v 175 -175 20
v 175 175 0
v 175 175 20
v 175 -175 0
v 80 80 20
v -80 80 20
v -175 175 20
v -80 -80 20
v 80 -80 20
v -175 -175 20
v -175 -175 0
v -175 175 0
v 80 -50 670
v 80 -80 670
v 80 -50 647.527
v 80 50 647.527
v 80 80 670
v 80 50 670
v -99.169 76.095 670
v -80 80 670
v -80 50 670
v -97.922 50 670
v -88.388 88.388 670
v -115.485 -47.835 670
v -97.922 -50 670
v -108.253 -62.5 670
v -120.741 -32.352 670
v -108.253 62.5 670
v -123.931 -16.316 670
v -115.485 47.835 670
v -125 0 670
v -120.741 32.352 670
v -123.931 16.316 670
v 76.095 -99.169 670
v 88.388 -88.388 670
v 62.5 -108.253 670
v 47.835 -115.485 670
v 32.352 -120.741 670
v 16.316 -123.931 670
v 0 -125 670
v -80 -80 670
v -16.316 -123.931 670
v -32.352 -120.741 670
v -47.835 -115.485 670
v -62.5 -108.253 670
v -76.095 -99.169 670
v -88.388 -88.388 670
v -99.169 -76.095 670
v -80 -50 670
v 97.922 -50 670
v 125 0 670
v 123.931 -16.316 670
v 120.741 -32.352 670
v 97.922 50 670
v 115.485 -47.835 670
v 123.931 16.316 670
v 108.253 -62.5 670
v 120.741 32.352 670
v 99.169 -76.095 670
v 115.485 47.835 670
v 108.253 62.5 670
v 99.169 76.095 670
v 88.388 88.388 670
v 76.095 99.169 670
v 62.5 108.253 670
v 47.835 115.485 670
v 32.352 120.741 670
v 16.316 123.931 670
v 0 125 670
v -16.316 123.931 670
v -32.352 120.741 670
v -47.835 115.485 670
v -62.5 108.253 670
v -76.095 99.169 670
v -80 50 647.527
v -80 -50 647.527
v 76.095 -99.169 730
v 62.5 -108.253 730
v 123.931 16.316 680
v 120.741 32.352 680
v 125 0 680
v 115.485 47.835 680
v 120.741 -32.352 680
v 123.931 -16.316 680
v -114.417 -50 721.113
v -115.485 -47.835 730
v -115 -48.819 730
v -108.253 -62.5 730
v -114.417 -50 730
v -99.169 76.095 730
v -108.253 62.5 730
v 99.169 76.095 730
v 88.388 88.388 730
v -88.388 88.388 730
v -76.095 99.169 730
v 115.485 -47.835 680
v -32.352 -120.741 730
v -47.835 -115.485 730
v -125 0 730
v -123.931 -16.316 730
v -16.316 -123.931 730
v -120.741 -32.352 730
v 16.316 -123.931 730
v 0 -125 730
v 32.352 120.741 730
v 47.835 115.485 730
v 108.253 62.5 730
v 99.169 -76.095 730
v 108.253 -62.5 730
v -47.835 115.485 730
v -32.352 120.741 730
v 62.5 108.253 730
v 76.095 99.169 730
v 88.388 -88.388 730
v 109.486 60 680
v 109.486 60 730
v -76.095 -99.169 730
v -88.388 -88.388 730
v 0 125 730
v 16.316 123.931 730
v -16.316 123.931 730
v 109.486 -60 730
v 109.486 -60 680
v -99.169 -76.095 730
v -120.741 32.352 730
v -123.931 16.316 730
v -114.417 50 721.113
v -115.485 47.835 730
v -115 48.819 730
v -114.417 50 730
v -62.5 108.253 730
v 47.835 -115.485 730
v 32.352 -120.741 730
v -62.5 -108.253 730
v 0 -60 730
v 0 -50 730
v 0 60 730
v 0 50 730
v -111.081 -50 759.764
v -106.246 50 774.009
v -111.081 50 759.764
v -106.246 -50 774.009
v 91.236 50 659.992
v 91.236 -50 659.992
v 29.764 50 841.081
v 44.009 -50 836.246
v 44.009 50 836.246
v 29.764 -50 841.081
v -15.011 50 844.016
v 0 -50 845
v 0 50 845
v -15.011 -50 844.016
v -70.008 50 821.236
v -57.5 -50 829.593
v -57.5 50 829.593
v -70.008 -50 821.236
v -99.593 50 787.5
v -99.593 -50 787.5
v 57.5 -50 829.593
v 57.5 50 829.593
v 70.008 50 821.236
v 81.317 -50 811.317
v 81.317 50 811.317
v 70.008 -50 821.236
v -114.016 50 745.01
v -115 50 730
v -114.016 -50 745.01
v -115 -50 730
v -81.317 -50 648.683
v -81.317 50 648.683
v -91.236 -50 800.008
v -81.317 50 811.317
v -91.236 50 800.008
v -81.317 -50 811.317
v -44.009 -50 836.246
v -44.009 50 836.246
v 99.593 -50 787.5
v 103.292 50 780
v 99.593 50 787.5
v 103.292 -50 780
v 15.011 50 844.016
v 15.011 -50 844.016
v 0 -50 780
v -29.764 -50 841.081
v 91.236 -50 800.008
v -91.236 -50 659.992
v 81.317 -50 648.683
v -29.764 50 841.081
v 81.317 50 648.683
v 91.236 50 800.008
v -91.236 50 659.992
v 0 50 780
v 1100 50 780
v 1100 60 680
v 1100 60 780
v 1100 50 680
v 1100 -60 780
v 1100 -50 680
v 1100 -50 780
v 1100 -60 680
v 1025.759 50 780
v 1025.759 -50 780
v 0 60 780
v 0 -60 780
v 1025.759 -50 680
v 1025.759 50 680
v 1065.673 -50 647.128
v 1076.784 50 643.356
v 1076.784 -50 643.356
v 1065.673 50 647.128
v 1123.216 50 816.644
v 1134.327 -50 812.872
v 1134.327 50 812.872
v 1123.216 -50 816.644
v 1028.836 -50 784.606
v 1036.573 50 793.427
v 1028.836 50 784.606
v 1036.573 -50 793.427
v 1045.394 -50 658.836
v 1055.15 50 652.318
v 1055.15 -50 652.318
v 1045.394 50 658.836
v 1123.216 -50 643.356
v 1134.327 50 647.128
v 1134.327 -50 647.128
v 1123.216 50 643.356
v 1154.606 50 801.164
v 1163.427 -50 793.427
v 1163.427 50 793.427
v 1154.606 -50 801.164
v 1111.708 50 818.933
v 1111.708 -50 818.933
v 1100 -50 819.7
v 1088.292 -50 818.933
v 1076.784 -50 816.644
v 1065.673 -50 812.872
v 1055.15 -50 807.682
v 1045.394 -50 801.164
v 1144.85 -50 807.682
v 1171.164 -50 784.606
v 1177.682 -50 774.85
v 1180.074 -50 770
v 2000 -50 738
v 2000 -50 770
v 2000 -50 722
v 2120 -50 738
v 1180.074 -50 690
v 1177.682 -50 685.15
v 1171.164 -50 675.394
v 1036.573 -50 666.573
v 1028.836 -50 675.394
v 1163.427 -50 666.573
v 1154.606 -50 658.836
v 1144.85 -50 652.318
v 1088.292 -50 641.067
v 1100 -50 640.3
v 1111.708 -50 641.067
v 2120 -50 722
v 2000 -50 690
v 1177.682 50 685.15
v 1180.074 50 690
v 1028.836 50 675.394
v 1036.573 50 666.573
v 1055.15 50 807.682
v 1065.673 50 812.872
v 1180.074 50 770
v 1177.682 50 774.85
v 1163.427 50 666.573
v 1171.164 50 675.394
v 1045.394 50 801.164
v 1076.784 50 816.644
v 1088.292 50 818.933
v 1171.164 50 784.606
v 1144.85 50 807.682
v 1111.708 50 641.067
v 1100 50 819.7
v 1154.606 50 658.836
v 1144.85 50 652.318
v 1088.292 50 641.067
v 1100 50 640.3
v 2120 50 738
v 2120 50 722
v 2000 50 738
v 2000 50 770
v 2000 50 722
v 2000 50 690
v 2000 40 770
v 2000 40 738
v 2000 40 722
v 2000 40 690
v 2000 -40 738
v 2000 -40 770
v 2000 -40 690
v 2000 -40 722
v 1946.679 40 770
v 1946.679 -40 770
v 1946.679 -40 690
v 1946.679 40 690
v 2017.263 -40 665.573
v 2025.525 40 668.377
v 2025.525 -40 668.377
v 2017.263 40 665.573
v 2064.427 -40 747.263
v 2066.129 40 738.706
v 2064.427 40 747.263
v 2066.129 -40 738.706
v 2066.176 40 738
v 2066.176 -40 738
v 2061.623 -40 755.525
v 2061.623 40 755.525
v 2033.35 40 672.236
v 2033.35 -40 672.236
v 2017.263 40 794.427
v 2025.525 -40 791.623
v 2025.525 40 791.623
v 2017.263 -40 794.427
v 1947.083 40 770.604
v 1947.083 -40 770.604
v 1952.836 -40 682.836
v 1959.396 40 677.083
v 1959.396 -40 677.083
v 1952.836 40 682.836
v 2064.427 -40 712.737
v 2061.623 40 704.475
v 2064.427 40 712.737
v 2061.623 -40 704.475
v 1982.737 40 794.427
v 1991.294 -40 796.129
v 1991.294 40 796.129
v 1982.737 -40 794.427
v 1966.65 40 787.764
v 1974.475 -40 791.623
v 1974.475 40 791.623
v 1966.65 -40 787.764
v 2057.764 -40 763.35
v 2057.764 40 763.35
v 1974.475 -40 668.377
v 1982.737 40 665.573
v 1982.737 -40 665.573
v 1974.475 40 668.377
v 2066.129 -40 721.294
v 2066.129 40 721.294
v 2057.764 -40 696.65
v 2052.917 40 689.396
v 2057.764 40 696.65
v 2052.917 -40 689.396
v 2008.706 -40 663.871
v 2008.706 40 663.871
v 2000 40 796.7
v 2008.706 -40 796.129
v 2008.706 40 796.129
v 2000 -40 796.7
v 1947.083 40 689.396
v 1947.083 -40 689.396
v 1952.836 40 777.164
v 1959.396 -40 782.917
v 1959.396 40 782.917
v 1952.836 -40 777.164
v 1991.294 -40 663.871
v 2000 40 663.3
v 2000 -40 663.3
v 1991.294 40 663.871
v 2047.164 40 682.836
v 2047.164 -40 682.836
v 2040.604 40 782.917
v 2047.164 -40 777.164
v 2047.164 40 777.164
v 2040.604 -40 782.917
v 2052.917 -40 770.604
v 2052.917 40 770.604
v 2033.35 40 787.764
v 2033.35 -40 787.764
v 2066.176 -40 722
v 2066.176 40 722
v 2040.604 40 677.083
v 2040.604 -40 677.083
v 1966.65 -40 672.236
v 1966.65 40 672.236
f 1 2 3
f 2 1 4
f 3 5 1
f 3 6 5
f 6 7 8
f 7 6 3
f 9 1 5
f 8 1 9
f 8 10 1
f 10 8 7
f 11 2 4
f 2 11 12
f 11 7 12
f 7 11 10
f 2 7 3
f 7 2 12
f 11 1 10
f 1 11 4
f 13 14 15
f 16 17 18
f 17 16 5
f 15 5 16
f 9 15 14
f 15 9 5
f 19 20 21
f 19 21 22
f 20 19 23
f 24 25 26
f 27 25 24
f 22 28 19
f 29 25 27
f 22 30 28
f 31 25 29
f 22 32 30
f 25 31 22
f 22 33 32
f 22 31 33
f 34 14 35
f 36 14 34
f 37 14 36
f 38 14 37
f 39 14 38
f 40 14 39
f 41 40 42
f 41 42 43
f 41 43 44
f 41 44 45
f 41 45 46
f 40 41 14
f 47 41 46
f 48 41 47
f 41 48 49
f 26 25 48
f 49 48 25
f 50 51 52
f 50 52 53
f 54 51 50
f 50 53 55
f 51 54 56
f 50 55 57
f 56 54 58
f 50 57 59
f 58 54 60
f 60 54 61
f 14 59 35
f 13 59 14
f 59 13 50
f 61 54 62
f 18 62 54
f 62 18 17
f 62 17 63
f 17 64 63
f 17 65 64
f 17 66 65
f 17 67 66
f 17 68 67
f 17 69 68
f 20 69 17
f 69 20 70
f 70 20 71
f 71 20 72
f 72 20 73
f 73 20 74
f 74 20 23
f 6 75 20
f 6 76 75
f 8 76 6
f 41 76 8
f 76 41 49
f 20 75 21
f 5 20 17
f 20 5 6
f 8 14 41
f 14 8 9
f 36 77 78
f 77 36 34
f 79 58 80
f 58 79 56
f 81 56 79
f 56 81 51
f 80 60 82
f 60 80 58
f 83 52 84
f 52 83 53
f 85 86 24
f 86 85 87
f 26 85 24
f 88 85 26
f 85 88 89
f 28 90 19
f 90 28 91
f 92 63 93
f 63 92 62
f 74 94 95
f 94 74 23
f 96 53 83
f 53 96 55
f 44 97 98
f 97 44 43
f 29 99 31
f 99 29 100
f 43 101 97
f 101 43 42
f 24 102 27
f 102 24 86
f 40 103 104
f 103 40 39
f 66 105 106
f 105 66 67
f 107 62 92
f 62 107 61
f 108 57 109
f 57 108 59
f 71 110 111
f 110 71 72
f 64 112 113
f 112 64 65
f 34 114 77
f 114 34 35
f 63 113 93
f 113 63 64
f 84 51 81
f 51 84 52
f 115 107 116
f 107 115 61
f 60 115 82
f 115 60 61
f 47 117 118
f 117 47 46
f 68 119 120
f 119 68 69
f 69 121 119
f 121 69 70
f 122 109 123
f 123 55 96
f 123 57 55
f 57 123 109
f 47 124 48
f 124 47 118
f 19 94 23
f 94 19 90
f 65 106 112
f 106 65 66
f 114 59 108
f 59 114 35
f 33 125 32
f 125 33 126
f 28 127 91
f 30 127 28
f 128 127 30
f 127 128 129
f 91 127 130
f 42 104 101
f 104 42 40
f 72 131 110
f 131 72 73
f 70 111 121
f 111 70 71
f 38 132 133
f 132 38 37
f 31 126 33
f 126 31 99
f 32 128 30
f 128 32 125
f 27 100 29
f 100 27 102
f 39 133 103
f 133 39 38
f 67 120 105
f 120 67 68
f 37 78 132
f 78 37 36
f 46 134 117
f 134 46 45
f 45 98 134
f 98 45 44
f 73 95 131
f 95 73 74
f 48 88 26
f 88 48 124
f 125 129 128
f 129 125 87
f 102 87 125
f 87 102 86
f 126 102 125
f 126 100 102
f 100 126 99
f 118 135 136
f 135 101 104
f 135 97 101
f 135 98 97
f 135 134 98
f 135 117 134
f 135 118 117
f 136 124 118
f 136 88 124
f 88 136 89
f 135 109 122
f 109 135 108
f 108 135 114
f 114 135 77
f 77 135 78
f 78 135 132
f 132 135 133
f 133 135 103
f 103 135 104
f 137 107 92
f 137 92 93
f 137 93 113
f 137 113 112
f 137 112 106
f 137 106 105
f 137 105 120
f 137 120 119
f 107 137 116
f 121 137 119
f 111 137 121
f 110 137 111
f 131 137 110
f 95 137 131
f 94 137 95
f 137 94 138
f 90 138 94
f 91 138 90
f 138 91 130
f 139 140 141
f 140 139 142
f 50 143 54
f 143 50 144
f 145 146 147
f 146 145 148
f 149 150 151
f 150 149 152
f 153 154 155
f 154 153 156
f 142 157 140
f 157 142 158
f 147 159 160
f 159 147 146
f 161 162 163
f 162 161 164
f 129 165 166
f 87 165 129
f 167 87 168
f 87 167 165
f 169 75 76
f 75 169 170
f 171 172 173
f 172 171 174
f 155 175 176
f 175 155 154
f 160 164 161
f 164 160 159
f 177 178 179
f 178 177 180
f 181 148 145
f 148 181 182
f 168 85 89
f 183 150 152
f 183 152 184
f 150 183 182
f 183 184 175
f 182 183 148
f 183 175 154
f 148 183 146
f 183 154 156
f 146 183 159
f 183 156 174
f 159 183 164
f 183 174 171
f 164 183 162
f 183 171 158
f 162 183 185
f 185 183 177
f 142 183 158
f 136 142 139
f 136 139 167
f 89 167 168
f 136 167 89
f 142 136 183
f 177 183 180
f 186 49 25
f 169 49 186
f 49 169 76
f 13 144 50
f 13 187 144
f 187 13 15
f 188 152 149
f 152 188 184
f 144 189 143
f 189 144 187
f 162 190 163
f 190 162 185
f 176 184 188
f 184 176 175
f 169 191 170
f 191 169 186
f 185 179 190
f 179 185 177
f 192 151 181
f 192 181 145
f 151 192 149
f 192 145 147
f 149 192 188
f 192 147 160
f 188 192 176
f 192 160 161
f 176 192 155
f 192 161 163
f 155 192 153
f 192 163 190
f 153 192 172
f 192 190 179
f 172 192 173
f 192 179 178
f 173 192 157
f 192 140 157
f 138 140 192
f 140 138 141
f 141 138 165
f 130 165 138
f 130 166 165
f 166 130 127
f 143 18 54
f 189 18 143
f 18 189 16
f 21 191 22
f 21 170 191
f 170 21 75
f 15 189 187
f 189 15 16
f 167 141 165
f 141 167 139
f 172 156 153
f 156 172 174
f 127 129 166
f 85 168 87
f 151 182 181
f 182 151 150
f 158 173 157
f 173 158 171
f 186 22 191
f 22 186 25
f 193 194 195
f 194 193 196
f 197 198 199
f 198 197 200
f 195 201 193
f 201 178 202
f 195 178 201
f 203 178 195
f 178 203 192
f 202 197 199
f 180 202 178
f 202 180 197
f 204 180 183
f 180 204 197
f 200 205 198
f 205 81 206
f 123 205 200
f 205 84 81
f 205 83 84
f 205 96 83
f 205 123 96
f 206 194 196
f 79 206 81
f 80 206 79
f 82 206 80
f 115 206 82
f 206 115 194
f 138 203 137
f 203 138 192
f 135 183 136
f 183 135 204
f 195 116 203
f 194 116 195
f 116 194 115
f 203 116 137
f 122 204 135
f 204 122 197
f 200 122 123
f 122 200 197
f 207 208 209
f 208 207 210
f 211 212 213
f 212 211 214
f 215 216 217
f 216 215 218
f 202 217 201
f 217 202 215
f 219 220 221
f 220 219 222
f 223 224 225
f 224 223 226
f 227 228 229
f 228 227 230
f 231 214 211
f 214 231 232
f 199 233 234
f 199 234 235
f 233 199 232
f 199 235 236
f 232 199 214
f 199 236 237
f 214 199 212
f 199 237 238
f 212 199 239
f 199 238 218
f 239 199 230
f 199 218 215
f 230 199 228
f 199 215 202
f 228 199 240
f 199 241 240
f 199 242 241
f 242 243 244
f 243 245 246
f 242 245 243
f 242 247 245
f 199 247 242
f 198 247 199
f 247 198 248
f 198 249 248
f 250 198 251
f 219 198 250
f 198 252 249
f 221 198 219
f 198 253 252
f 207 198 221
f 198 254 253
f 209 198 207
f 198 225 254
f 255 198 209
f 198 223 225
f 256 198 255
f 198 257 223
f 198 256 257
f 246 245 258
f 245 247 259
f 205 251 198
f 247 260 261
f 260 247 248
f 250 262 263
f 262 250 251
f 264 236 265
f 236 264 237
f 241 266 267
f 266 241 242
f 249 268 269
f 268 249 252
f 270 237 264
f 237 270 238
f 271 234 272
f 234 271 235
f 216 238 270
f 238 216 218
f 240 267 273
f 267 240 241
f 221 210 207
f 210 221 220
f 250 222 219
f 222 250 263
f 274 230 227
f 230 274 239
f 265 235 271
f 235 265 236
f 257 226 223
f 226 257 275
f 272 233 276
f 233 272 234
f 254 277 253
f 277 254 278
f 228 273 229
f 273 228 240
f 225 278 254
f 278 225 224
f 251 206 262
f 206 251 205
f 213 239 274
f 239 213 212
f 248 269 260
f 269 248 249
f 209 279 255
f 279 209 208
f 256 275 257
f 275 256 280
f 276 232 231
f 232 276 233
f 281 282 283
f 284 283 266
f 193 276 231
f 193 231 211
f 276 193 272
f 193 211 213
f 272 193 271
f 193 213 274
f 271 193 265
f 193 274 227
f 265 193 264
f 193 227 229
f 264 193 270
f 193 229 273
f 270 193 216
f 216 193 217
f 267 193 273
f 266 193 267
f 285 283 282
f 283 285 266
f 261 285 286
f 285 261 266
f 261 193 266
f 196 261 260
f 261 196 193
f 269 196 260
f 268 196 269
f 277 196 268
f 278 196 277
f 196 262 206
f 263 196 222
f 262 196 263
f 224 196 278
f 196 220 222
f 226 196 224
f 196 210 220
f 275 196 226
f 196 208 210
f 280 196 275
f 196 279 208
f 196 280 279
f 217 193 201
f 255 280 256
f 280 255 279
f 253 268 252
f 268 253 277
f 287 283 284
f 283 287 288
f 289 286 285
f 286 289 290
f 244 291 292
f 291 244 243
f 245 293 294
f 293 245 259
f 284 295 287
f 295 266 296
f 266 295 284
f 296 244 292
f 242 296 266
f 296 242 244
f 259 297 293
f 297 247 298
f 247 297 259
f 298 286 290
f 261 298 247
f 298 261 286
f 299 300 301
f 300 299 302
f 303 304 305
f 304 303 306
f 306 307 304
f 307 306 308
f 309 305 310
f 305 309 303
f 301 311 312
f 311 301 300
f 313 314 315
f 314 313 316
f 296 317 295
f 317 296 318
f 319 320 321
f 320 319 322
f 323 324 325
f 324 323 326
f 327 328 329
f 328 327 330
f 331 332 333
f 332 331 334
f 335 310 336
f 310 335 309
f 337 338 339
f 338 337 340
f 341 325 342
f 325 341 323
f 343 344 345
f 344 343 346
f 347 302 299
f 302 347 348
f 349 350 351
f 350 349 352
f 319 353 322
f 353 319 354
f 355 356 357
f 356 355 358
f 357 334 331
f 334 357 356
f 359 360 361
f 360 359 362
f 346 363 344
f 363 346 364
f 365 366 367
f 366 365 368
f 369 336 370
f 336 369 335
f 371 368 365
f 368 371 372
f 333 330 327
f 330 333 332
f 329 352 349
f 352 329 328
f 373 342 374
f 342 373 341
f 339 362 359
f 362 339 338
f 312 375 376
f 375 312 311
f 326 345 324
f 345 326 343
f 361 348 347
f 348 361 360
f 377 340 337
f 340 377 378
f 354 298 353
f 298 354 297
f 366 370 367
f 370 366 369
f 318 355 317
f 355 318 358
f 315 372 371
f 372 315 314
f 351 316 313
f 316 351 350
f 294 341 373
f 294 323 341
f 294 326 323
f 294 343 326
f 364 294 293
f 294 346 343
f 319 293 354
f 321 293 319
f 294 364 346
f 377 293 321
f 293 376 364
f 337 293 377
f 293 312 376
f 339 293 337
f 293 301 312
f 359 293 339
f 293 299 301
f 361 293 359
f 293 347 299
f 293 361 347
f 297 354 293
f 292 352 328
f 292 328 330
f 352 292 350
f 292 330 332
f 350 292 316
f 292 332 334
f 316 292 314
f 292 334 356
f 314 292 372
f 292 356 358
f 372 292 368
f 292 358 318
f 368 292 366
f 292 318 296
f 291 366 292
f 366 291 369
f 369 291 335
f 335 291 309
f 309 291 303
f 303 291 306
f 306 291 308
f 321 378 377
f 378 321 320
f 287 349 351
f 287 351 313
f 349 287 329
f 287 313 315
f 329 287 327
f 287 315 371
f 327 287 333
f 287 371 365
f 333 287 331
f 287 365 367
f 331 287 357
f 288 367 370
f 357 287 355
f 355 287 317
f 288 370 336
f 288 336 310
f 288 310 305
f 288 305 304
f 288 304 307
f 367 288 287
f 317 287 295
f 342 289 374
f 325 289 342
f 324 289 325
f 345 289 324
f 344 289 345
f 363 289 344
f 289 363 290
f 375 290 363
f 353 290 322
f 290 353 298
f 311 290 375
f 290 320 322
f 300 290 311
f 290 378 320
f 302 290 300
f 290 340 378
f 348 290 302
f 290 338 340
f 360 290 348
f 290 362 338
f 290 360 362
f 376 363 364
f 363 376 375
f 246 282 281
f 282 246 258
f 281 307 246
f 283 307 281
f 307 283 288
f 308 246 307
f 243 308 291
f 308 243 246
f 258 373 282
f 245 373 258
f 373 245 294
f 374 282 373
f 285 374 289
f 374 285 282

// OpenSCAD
// AGASTYA Stage 2 concept envelope, millimetres.
// Parametric visualization only; no material, wall, joint, bearing, motor, tool or load design.
$fn=48;
L1=1100; L2=900; shoulder_z=730; base_t=20; pedestal_h=650; yaw_t=60;
module arm_envelope() {
  color("slategray") translate([0,0,base_t/2]) cube([350,350,base_t],center=true);
  color("silver") translate([0,0,base_t+pedestal_h/2]) cube([160,160,pedestal_h],center=true);
  color("steelblue") translate([0,0,base_t+pedestal_h+yaw_t/2]) cylinder(d=250,h=yaw_t,center=true);
  color("orange") translate([0,0,shoulder_z]) rotate([90,0,0]) cylinder(d=230,h=100,center=true);
  color("royalblue") translate([L1/2,0,shoulder_z]) cube([L1,120,100],center=true);
  color("orange") translate([L1,0,shoulder_z]) rotate([90,0,0]) cylinder(d=179.4,h=100,center=true);
  color("royalblue") translate([L1+L2/2,0,shoulder_z]) cube([L2,100,80],center=true);
  color("orange") translate([L1+L2,0,shoulder_z]) rotate([90,0,0]) cylinder(d=133.4,h=80,center=true);
  color("gold") translate([L1+L2+60,0,shoulder_z]) cube([120,100,16],center=true);
}
arm_envelope();
